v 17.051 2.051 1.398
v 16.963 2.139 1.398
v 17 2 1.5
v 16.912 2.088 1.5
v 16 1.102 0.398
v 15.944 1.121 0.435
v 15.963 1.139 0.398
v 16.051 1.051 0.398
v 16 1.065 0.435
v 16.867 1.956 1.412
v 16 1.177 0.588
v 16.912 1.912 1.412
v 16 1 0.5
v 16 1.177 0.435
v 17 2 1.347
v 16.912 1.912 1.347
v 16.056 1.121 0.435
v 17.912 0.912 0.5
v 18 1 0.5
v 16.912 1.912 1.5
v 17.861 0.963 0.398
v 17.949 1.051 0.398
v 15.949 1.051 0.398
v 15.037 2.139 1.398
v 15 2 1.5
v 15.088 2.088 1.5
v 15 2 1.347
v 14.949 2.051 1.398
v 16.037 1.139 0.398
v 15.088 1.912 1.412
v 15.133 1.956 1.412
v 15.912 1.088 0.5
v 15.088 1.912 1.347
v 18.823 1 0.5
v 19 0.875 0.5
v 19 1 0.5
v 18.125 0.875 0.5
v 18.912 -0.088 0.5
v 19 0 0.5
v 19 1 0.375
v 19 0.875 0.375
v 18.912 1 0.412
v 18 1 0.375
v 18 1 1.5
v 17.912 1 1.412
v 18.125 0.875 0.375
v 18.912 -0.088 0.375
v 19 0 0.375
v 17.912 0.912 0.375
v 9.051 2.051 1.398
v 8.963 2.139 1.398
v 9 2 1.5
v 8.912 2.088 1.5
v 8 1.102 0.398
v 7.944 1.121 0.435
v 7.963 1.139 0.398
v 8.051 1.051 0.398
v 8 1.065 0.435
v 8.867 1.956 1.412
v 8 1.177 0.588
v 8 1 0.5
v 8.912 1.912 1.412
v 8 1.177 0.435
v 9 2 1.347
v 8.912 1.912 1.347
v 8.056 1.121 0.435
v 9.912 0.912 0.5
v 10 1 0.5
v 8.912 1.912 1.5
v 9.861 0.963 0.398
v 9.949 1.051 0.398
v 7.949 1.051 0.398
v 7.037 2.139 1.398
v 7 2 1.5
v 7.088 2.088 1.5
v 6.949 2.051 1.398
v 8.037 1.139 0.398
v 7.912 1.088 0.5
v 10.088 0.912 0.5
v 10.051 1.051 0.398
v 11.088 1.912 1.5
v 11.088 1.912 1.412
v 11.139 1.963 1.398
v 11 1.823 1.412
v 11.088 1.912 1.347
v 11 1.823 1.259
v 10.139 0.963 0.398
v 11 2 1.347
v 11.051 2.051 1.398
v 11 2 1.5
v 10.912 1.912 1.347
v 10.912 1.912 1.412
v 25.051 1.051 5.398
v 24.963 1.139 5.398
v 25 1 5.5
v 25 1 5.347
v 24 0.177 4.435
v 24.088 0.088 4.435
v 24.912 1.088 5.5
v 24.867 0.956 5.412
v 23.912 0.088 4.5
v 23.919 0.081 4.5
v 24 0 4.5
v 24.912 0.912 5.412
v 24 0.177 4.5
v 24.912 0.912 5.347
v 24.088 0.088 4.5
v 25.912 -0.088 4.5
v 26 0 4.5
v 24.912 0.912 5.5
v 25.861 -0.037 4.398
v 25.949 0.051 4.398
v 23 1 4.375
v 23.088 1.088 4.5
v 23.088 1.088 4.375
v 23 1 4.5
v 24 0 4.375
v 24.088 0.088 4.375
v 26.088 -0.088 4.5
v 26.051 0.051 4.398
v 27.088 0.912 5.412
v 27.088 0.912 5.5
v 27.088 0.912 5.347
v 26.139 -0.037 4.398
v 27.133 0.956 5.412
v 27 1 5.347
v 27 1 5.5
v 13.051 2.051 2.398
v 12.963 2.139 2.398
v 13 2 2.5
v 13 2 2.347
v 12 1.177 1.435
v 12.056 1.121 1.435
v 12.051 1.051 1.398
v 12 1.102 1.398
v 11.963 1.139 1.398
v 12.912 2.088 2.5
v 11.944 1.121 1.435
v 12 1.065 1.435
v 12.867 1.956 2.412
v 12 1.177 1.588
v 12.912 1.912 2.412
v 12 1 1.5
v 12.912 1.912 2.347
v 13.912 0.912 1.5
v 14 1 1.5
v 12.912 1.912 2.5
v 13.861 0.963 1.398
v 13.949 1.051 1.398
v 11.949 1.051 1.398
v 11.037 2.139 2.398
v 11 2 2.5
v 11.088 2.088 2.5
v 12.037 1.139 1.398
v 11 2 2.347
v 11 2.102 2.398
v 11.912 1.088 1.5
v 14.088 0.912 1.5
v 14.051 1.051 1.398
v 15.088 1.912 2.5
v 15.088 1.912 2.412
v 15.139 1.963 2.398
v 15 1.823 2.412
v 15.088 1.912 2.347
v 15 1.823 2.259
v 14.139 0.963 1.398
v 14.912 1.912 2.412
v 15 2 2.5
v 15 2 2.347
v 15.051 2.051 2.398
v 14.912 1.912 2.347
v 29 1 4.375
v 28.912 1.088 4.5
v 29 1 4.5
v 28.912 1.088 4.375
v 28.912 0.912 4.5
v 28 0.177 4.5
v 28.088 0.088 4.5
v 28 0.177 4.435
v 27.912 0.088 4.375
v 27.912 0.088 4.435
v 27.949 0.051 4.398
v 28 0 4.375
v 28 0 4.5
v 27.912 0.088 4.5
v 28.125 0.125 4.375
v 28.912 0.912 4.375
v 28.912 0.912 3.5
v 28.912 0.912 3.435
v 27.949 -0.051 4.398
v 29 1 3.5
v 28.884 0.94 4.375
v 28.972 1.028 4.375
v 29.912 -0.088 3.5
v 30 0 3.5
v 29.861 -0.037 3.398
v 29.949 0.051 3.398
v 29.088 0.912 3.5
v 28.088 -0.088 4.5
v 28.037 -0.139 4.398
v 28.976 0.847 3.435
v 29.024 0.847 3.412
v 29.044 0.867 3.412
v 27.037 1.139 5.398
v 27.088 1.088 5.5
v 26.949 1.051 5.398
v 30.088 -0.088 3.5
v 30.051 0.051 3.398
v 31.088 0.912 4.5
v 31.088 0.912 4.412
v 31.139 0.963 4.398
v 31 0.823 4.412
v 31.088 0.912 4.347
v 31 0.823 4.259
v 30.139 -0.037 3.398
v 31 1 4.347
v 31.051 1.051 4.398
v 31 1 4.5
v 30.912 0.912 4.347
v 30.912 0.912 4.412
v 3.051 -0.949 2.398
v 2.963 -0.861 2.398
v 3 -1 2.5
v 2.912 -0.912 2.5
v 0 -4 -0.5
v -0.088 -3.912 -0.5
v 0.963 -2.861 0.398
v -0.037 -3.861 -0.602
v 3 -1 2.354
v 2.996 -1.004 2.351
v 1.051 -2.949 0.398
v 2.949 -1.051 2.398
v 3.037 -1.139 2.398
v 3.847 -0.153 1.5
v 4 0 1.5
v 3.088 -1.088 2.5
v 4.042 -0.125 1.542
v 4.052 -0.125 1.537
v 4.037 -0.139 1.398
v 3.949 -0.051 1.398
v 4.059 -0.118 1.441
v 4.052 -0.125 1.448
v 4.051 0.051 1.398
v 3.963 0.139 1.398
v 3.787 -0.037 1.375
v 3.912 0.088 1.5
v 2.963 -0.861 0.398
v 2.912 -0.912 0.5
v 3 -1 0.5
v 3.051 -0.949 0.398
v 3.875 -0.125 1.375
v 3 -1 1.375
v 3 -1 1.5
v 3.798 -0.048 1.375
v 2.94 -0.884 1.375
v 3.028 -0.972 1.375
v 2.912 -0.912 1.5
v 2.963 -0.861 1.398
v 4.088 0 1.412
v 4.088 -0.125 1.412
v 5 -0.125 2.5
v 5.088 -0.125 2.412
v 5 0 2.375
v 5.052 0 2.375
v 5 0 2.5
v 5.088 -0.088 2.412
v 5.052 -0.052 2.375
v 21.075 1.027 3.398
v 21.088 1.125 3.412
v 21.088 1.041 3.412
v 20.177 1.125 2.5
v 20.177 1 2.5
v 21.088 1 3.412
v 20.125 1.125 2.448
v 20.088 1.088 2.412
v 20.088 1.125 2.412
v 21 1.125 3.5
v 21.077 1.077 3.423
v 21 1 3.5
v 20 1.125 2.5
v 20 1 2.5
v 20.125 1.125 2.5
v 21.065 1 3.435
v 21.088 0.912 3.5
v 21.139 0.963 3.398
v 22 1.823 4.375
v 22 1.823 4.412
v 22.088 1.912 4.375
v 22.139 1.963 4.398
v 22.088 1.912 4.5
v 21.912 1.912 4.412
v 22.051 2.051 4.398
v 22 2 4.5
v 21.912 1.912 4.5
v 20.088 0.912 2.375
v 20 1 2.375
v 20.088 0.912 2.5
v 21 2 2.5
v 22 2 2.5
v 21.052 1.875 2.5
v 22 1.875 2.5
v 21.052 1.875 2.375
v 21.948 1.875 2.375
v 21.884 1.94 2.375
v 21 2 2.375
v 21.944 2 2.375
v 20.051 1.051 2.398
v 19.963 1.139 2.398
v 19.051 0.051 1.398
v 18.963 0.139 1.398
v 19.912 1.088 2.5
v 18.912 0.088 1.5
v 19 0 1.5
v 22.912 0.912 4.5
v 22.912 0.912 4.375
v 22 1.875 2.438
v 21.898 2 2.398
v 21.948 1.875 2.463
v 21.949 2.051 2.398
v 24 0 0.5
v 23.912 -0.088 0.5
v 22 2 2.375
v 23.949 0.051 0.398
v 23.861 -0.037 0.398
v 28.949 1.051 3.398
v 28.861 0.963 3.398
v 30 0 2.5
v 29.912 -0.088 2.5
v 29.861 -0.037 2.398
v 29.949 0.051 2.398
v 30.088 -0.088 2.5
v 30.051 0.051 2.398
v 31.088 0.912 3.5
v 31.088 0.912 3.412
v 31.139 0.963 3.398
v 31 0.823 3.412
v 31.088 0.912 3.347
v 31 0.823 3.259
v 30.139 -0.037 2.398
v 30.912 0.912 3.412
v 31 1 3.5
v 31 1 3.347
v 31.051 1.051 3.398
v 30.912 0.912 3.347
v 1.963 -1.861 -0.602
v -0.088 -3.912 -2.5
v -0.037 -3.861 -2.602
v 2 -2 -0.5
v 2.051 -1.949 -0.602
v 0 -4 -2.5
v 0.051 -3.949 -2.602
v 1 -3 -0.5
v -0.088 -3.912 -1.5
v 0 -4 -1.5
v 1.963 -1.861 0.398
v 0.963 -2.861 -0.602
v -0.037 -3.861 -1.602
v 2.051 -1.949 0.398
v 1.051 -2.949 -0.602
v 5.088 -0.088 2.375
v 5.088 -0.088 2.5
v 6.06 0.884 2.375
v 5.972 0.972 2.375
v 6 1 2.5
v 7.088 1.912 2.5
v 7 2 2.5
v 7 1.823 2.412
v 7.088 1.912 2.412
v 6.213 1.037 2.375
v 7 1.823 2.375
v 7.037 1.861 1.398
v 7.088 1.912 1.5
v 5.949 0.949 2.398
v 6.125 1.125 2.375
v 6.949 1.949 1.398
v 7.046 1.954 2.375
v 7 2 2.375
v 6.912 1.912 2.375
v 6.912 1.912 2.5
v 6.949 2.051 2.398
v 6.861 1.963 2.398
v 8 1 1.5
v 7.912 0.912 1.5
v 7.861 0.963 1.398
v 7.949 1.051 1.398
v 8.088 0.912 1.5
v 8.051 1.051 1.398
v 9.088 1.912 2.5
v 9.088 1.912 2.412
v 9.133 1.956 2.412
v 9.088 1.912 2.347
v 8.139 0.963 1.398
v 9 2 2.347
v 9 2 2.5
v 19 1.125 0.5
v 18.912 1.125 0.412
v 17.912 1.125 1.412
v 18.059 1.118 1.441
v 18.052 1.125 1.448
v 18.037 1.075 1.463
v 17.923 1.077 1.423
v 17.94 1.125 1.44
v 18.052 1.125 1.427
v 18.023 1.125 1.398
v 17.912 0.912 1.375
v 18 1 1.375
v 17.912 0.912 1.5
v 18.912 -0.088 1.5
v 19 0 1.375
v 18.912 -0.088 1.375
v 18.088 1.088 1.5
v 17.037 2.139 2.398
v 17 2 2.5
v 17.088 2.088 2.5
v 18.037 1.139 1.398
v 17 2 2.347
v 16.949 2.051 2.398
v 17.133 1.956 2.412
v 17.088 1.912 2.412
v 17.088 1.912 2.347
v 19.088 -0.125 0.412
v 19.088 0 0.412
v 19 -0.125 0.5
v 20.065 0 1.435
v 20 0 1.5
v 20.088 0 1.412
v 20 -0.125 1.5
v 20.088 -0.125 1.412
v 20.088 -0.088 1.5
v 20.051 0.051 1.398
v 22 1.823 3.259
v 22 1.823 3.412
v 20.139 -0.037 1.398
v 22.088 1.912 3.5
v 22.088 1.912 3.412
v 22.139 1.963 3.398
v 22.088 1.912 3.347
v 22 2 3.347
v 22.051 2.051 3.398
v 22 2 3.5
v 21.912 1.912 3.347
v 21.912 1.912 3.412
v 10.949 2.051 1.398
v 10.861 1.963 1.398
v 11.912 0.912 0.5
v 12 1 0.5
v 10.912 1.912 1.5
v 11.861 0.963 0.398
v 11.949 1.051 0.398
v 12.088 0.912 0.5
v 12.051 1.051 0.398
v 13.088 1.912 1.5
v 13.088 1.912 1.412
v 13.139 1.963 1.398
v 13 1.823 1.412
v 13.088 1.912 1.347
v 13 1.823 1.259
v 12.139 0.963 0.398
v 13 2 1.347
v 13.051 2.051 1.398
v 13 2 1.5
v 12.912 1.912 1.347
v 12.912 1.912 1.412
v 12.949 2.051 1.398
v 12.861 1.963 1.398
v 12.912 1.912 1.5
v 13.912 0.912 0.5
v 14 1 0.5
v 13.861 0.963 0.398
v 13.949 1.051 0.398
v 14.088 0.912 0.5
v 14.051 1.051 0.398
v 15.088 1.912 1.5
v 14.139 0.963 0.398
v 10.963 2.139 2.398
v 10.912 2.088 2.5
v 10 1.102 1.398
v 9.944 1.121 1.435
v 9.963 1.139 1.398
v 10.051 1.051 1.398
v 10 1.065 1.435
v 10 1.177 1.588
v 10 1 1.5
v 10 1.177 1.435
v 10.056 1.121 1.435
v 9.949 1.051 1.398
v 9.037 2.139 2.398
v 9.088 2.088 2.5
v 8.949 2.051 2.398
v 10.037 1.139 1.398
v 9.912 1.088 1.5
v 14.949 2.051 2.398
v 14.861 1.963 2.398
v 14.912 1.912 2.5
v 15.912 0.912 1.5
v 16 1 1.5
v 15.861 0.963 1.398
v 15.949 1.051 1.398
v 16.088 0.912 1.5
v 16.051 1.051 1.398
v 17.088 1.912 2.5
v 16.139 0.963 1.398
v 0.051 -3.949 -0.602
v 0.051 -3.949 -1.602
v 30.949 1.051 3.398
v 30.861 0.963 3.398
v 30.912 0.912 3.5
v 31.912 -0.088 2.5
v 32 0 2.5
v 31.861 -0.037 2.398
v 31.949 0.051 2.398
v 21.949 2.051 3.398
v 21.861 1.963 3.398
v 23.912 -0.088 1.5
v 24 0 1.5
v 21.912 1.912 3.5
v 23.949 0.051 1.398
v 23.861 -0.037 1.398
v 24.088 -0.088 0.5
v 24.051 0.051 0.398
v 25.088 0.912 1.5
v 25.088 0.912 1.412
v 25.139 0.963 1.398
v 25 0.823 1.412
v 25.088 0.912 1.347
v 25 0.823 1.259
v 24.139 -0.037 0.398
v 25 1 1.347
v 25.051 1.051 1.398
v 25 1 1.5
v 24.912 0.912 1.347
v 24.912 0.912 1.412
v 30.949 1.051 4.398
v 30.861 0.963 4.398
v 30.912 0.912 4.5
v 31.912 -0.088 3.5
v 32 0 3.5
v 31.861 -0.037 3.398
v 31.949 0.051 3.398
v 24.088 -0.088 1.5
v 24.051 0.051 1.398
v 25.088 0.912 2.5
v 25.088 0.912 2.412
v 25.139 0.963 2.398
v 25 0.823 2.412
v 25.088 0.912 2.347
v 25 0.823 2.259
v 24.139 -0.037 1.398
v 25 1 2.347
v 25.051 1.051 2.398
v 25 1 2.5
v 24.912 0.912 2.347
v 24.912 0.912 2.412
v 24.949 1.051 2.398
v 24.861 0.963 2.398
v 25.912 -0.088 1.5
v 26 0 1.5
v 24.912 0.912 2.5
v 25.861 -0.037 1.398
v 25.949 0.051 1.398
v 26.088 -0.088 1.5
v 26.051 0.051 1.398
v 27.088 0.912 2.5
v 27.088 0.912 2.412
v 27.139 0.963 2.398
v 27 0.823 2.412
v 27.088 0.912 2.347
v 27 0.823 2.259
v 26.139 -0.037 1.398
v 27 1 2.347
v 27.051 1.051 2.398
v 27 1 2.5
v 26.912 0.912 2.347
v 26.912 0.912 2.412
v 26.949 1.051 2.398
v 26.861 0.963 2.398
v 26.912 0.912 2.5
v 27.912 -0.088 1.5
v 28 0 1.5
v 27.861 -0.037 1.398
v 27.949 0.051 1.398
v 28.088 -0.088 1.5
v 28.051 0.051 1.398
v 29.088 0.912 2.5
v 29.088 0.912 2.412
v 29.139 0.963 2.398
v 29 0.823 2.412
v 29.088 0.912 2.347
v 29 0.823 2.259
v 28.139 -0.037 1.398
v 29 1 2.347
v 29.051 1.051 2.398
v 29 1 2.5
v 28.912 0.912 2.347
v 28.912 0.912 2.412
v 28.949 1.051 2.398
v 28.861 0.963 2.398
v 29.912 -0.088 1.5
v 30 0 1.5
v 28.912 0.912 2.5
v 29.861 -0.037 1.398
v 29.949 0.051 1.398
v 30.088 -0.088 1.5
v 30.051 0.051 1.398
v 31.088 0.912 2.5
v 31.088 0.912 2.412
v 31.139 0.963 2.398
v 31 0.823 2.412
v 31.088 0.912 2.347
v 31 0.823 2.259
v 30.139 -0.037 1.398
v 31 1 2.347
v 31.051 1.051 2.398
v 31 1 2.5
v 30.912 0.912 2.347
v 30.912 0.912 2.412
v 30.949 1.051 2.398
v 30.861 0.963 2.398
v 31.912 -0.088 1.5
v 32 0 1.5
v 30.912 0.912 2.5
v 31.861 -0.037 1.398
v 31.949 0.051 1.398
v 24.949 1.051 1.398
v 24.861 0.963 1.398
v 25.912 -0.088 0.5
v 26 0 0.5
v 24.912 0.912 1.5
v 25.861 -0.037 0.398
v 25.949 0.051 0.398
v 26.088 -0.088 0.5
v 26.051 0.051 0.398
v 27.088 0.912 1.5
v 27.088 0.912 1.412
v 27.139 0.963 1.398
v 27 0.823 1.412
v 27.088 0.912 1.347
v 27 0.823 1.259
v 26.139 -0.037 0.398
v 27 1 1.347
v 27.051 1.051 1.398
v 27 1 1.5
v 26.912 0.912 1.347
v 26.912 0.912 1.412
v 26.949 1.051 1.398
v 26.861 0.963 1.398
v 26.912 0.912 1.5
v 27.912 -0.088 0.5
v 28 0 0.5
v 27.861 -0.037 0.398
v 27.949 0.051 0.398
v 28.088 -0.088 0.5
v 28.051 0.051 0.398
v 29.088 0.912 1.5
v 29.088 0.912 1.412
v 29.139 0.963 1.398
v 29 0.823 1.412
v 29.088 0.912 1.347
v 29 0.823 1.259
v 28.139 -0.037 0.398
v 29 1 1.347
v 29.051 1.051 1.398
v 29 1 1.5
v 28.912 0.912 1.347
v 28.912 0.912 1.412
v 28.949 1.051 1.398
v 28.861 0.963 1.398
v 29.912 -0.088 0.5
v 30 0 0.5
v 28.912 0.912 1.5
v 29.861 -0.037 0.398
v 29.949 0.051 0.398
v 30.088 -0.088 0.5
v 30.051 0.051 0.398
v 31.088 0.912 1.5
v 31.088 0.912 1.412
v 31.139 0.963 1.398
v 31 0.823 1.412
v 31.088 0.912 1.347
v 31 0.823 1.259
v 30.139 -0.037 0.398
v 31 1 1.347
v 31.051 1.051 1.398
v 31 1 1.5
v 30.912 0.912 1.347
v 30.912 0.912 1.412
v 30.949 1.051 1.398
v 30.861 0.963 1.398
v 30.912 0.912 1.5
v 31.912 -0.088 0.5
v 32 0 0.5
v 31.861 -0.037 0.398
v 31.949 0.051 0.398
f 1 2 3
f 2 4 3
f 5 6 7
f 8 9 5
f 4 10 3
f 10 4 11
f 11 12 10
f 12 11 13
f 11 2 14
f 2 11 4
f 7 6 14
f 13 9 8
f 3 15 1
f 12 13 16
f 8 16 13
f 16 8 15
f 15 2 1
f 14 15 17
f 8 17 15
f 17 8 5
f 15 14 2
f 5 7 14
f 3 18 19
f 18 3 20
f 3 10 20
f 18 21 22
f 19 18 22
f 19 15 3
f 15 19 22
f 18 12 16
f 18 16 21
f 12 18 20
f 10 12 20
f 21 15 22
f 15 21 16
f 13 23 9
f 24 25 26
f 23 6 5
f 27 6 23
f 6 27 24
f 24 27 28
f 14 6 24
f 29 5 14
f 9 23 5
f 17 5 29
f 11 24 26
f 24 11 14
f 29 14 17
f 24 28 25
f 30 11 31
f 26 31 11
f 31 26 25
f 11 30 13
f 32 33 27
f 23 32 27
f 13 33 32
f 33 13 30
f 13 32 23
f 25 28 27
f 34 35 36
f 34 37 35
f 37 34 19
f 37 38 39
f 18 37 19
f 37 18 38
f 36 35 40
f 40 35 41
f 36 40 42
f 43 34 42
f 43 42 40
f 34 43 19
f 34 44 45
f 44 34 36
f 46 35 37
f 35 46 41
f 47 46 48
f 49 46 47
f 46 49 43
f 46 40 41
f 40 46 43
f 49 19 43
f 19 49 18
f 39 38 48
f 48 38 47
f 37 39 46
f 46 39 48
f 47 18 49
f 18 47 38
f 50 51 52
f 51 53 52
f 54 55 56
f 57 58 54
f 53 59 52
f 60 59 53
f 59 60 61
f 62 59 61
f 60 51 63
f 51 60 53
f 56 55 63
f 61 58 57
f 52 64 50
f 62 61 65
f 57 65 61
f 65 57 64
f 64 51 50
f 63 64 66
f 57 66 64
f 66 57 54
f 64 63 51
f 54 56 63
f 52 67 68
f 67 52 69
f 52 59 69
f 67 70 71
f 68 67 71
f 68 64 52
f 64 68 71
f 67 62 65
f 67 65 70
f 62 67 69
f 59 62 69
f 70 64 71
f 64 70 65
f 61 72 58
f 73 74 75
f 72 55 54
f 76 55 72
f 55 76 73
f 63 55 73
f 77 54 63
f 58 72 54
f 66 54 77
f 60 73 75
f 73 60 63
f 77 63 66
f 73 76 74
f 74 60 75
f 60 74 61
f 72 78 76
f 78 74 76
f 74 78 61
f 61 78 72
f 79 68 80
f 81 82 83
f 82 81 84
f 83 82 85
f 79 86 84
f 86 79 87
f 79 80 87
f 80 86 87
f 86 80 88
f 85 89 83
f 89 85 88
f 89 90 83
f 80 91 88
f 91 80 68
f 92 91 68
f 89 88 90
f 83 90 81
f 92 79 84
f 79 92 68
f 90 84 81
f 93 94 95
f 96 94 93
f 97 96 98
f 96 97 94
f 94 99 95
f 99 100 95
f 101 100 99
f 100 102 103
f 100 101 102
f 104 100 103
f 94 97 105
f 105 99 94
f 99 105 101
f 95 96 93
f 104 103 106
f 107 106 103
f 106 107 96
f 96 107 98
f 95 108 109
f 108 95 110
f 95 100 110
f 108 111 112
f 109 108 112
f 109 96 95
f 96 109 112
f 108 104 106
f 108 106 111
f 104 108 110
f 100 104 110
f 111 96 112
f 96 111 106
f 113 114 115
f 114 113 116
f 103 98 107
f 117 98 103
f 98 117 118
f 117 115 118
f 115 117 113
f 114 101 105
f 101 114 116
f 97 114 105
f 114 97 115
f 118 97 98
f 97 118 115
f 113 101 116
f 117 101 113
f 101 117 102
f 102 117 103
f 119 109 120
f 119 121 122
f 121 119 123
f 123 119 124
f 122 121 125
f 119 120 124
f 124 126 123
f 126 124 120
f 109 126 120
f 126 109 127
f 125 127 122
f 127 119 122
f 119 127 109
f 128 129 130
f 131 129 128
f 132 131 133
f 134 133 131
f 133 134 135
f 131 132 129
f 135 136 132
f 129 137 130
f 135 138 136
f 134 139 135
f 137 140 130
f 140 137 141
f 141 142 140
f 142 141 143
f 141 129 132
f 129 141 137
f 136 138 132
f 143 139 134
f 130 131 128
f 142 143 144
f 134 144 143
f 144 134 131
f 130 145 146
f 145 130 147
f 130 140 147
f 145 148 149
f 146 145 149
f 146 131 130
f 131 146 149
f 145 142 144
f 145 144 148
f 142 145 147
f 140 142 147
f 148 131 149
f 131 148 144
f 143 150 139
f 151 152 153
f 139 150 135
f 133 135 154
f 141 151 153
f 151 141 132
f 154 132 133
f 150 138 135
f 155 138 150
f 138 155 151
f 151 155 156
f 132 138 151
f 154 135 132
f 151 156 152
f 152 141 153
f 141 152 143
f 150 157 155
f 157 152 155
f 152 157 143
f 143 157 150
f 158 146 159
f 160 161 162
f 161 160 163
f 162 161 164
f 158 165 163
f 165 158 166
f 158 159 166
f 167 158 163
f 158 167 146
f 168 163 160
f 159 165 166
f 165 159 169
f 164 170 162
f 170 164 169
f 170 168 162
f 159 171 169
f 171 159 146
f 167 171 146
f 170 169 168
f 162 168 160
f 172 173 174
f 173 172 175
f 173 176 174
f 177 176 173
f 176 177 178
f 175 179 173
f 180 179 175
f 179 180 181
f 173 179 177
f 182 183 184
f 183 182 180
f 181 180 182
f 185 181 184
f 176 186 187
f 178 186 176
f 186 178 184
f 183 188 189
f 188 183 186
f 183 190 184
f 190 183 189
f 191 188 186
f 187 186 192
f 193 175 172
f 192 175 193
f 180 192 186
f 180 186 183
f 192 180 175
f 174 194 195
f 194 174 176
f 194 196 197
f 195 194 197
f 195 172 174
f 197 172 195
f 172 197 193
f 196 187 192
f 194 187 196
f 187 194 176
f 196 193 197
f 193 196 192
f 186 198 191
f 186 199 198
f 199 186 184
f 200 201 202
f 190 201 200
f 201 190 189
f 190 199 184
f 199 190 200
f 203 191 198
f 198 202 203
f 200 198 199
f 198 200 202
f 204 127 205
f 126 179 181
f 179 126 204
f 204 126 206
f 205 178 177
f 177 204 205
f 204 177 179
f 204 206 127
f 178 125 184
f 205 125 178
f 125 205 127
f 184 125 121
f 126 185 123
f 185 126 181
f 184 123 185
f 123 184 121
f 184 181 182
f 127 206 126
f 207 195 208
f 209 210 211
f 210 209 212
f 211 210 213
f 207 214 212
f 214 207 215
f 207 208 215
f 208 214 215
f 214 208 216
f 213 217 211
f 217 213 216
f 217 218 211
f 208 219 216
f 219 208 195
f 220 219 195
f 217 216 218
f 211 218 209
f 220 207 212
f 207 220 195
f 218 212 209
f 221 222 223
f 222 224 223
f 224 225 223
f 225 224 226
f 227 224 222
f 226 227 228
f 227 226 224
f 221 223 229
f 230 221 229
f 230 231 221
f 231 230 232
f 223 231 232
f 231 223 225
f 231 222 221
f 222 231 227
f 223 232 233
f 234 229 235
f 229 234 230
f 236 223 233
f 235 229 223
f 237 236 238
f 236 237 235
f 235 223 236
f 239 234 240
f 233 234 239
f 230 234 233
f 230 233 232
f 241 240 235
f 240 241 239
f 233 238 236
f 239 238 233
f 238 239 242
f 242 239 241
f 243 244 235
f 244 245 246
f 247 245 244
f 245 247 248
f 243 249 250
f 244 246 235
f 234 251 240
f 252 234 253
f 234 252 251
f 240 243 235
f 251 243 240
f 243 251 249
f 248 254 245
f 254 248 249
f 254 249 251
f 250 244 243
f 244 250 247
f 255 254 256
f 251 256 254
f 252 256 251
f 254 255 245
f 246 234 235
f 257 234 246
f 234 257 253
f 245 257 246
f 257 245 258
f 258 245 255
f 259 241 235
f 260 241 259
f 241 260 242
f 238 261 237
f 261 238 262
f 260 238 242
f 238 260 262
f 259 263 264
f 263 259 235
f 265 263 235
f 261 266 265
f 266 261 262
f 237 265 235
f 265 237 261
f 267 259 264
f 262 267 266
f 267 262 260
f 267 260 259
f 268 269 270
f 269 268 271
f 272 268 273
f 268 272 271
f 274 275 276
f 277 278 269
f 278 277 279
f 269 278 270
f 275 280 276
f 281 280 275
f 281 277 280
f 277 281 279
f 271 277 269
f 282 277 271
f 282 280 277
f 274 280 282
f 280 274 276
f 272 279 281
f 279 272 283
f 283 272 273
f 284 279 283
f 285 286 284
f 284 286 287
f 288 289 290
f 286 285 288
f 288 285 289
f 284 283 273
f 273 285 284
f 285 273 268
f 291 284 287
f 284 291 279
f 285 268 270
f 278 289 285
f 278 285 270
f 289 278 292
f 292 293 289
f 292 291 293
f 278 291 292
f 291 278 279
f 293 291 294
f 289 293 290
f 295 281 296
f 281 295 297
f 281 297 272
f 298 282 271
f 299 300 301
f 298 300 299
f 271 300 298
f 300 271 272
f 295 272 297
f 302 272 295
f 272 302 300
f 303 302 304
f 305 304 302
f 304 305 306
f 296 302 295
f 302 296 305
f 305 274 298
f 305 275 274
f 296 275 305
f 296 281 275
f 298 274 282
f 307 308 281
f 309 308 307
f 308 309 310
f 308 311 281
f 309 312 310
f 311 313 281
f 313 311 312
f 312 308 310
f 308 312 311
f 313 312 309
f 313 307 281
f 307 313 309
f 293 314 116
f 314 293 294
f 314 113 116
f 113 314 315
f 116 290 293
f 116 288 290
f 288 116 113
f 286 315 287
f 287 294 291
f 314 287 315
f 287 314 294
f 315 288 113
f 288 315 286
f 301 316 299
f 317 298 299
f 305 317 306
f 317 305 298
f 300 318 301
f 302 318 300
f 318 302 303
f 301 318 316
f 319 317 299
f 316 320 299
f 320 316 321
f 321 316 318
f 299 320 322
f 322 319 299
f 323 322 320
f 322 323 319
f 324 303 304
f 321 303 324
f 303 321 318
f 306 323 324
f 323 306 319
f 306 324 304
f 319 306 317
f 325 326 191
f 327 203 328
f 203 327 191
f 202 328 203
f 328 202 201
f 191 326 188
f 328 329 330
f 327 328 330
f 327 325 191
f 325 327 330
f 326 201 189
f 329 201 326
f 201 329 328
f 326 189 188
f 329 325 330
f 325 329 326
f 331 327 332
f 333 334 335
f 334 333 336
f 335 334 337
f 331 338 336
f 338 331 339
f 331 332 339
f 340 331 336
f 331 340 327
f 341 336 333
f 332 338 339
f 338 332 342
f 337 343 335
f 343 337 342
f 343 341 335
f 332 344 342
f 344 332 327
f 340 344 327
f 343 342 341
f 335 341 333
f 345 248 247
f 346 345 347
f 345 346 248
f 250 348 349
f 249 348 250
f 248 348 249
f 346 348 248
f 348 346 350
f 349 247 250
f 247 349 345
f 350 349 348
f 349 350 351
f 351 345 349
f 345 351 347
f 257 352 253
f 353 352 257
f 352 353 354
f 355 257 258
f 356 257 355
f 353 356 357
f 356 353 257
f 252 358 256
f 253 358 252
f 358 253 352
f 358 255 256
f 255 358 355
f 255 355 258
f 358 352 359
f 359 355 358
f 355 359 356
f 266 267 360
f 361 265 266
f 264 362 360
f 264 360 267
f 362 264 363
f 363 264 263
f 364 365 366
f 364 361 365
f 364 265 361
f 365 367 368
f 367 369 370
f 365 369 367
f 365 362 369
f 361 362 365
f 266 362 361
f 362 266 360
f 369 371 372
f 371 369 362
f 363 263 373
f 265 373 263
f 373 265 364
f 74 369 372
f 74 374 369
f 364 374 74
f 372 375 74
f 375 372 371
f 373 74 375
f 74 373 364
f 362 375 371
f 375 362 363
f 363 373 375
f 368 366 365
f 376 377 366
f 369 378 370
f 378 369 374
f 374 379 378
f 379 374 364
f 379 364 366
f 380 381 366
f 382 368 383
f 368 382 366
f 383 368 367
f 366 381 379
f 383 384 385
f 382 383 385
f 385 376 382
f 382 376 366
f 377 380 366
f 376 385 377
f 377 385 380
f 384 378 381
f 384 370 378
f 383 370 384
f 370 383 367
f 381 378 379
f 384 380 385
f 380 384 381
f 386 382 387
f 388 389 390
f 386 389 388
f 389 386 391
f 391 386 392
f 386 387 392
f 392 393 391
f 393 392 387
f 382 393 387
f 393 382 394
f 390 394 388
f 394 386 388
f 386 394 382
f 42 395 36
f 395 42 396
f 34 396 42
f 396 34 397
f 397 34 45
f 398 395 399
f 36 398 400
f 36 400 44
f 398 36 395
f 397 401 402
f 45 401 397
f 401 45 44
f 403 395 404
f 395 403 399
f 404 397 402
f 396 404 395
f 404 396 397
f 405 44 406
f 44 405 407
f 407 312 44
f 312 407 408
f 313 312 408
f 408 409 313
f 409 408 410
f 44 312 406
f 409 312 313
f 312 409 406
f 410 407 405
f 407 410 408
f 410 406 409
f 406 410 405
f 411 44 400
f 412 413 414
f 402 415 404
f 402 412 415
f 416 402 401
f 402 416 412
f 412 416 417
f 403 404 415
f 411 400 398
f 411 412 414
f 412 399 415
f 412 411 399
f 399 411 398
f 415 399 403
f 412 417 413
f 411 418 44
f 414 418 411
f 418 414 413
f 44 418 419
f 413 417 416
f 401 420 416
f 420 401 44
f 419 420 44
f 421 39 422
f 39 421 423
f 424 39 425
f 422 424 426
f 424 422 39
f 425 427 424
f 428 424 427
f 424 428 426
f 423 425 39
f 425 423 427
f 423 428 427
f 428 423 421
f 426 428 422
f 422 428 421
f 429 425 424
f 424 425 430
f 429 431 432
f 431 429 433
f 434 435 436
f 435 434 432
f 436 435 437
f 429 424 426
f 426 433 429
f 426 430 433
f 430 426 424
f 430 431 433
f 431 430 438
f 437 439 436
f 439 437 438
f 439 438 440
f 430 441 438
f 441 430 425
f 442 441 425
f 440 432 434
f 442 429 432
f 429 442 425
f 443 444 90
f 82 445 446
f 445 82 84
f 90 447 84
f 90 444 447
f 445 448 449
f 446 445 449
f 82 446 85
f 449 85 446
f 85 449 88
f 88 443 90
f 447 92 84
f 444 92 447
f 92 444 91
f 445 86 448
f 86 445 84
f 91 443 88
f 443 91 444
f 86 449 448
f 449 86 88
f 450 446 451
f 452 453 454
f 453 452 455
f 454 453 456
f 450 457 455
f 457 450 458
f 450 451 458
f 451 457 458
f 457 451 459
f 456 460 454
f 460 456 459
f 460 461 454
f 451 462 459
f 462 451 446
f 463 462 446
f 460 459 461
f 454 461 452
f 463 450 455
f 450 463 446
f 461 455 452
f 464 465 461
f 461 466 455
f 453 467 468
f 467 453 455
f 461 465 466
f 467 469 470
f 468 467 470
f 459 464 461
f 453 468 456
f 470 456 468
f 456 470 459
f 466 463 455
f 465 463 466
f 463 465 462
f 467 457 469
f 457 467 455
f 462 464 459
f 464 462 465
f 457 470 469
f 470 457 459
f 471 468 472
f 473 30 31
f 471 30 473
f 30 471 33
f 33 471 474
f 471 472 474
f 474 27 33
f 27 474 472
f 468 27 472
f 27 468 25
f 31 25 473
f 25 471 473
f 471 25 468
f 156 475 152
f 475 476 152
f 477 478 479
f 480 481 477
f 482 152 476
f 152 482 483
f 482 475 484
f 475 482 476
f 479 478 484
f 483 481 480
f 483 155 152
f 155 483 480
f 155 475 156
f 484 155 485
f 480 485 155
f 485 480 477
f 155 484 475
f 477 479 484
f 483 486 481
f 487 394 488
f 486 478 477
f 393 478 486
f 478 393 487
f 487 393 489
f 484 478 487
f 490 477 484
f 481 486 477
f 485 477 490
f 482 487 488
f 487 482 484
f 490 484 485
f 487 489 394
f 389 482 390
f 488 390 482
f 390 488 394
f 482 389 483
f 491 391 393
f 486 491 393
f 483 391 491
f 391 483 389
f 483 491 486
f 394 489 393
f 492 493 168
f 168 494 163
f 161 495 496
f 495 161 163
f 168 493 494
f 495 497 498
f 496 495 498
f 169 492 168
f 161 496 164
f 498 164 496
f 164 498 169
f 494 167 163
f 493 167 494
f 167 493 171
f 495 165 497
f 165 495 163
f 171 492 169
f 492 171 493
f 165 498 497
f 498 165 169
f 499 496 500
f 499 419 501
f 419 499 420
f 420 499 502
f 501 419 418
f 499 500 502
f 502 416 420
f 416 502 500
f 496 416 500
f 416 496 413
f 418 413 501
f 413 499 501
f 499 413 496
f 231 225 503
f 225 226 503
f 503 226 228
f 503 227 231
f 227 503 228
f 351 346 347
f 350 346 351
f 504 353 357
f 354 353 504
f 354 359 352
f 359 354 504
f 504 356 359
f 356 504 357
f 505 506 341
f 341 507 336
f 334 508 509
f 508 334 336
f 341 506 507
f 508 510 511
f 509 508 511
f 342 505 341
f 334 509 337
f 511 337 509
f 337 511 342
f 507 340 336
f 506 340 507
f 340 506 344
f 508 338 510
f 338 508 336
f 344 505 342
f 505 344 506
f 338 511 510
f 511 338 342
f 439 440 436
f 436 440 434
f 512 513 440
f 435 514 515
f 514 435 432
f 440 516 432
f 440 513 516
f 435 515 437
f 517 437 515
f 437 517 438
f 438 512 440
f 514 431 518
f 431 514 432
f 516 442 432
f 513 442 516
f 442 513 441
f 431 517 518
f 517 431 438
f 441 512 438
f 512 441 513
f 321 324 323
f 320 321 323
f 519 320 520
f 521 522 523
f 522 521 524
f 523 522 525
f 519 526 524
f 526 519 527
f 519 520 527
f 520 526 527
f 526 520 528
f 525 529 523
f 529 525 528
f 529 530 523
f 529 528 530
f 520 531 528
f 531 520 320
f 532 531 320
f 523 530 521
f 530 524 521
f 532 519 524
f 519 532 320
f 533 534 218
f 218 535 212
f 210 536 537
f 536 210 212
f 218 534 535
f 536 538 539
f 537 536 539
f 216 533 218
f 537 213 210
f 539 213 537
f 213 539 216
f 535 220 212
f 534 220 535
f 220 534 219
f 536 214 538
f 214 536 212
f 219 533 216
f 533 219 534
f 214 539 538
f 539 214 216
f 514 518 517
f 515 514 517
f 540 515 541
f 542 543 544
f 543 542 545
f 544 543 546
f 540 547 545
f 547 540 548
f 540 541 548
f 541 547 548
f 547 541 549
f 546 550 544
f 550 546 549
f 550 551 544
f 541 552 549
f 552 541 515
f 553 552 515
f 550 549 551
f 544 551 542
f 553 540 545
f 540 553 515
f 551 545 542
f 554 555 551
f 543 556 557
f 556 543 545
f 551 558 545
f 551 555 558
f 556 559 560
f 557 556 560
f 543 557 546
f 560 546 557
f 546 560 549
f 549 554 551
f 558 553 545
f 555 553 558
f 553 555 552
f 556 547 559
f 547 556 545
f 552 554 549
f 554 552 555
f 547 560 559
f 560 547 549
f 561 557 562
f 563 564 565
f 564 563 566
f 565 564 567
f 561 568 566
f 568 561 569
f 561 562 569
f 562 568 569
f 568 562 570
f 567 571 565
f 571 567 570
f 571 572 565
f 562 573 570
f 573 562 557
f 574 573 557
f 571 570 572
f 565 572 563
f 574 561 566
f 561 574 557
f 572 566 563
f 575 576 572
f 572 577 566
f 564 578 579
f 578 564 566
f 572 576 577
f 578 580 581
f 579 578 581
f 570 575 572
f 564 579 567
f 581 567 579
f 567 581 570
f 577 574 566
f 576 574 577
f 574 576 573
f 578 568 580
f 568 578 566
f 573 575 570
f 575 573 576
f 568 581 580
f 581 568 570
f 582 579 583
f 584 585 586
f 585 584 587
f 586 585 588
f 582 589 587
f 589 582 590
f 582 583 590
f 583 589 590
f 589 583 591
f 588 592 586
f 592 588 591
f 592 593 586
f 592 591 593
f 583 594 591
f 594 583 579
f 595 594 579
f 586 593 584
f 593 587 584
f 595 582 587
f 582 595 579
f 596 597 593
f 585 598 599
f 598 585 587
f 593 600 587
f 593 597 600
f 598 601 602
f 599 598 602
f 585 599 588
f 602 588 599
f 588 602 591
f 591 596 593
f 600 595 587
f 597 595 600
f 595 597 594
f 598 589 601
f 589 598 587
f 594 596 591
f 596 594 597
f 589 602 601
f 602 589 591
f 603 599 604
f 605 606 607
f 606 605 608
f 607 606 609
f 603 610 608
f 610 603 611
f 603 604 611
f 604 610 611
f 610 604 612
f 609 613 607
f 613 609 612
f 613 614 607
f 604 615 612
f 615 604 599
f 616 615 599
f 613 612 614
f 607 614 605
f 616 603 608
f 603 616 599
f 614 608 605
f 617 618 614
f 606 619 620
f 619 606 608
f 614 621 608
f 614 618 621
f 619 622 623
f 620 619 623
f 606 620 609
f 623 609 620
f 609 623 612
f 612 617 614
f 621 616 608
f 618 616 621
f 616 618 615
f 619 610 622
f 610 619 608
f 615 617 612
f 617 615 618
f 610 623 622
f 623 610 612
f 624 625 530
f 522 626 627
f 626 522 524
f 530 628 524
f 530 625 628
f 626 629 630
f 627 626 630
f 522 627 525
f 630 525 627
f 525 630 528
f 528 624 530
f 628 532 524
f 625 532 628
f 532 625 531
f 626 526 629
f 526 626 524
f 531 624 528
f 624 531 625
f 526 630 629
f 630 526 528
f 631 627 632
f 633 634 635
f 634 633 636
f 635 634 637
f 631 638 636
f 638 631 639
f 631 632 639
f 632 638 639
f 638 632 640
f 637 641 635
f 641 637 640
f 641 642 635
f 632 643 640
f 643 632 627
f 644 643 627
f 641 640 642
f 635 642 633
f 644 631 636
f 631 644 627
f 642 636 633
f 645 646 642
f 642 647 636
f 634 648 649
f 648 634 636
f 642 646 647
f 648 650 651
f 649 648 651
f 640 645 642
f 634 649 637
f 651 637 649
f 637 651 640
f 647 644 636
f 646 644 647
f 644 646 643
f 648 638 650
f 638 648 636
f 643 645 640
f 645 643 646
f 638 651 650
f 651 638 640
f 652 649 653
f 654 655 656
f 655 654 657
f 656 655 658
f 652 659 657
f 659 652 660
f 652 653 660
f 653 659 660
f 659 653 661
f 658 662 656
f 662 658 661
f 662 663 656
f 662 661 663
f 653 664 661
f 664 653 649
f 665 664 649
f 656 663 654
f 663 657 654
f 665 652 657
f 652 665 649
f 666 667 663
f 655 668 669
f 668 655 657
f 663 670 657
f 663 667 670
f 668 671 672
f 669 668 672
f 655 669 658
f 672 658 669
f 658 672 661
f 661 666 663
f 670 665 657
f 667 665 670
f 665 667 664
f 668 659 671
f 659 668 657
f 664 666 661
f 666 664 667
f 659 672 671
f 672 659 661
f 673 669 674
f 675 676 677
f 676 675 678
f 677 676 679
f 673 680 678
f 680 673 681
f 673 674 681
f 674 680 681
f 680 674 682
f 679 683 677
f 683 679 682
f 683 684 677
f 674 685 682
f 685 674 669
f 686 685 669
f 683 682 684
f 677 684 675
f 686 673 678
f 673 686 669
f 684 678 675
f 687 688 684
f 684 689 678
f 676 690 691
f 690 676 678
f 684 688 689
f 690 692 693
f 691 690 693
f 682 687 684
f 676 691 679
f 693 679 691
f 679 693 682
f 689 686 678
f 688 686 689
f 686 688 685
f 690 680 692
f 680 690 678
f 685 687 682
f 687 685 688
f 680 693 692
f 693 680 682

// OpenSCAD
translate(v = [-0.5, -0.5, 0]) {
	union() {
		%union() {
			union() {
				%cube(size = [0, 0, 0]);
				translate(v = [17.0, 2.0, 1.0]) {
					cube(size = [1, 1, 1]);
				}
				color(alpha = 0.1, c = "lightgreen") {
					translate(v = [16.0, 1.0, 0.0]) {
						cube(size = [1, 1, 1]);
					}
				}
				color(alpha = 0.1, c = "lightgreen") {
					translate(v = [18.0, 1.0, 0.0]) {
						cube(size = [1, 1, 1]);
					}
				}
				translate(v = [9.0, 2.0, 1.0]) {
					cube(size = [1, 1, 1]);
				}
				color(alpha = 0.1, c = "lightgreen") {
					translate(v = [8.0, 1.0, 0.0]) {
						cube(size = [1, 1, 1]);
					}
				}
				color(alpha = 0.1, c = "lightgreen") {
					translate(v = [10.0, 1.0, 0.0]) {
						cube(size = [1, 1, 1]);
					}
				}
				translate(v = [25.0, 1.0, 5.0]) {
					cube(size = [1, 1, 1]);
				}
				color(alpha = 0.1, c = "lightgreen") {
					translate(v = [24.0, 0.0, 4.0]) {
						cube(size = [1, 1, 1]);
					}
				}
				color(alpha = 0.1, c = "lightgreen") {
					translate(v = [26.0, 0.0, 4.0]) {
						cube(size = [1, 1, 1]);
					}
				}
				translate(v = [13.0, 2.0, 2.0]) {
					cube(size = [1, 1, 1]);
				}
				color(alpha = 0.1, c = "lightgreen") {
					translate(v = [12.0, 1.0, 1.0]) {
						cube(size = [1, 1, 1]);
					}
				}
				color(alpha = 0.1, c = "lightgreen") {
					translate(v = [14.0, 1.0, 1.0]) {
						cube(size = [1, 1, 1]);
					}
				}
				translate(v = [29.0, 1.0, 4.0]) {
					cube(size = [1, 1, 1]);
				}
				color(alpha = 0.1, c = "lightgreen") {
					translate(v = [28.0, 0.0, 4.0]) {
						cube(size = [1, 1, 1]);
					}
				}
				color(alpha = 0.1, c = "lightgreen") {
					translate(v = [30.0, 0.0, 3.0]) {
						cube(size = [1, 1, 1]);
					}
				}
				translate(v = [3.0, -1.0, 2.0]) {
					cube(size = [1, 1, 1]);
				}
				color(alpha = 0.1, c = "lightgreen") {
					translate(v = [2.0, -2.0, 1.0]) {
						cube(size = [1, 1, 1]);
					}
				}
				color(alpha = 0.1, c = "lightgreen") {
					translate(v = [4.0, -0.0, 1.0]) {
						cube(size = [1, 1, 1]);
					}
				}
				translate(v = [21.0, 1.0, 3.0]) {
					cube(size = [1, 1, 1]);
				}
				color(alpha = 0.1, c = "lightgreen") {
					translate(v = [20.0, 1.0, 2.0]) {
						cube(size = [1, 1, 1]);
					}
				}
				color(alpha = 0.1, c = "lightgreen") {
					translate(v = [22.0, 2.0, 4.0]) {
						cube(size = [1, 1, 1]);
					}
				}
				translate(v = [21.0, 2.0, 2.0]) {
					cube(size = [1, 1, 1]);
				}
				color(alpha = 0.1, c = "lightgreen") {
					translate(v = [22.0, 2.0, 2.0]) {
						cube(size = [1, 1, 1]);
					}
				}
				translate(v = [29.0, 1.0, 3.0]) {
					cube(size = [1, 1, 1]);
				}
				color(alpha = 0.1, c = "lightgreen") {
					translate(v = [30.0, 0.0, 2.0]) {
						cube(size = [1, 1, 1]);
					}
				}
				translate(v = [3.0, -1.0, 0.0]) {
					cube(size = [1, 1, 1]);
				}
				color(alpha = 0.1, c = "lightgreen") {
					translate(v = [2.0, -2.0, -1.0]) {
						cube(size = [1, 1, 1]);
					}
				}
				translate(v = [3.0, -1.0, 1.0]) {
					cube(size = [1, 1, 1]);
				}
				color(alpha = 0.1, c = "lightgreen") {
					translate(v = [2.0, -2.0, 0.0]) {
						cube(size = [1, 1, 1]);
					}
				}
				translate(v = [5.0, 0.0, 2.0]) {
					cube(size = [1, 1, 1]);
				}
				color(alpha = 0.1, c = "lightgreen") {
					translate(v = [6.0, 1.0, 2.0]) {
						cube(size = [1, 1, 1]);
					}
				}
				translate(v = [7.0, 2.0, 1.0]) {
					cube(size = [1, 1, 1]);
				}
				translate(v = [7.0, 2.0, 2.0]) {
					cube(size = [1, 1, 1]);
				}
				color(alpha = 0.1, c = "lightgreen") {
					translate(v = [8.0, 1.0, 1.0]) {
						cube(size = [1, 1, 1]);
					}
				}
				translate(v = [19.0, 1.0, 0.0]) {
					cube(size = [1, 1, 1]);
				}
				color(alpha = 0.1, c = "lightgreen") {
					translate(v = [18.0, 1.0, 1.0]) {
						cube(size = [1, 1, 1]);
					}
				}
				translate(v = [19.0, 0.0, 0.0]) {
					cube(size = [1, 1, 1]);
				}
				color(alpha = 0.1, c = "lightgreen") {
					translate(v = [20.0, 0.0, 1.0]) {
						cube(size = [1, 1, 1]);
					}
				}
				translate(v = [19.0, 0.0, 1.0]) {
					cube(size = [1, 1, 1]);
				}
				translate(v = [11.0, 2.0, 1.0]) {
					cube(size = [1, 1, 1]);
				}
				color(alpha = 0.1, c = "lightgreen") {
					translate(v = [12.0, 1.0, 0.0]) {
						cube(size = [1, 1, 1]);
					}
				}
				translate(v = [13.0, 2.0, 1.0]) {
					cube(size = [1, 1, 1]);
				}
				color(alpha = 0.1, c = "lightgreen") {
					translate(v = [14.0, 1.0, 0.0]) {
						cube(size = [1, 1, 1]);
					}
				}
				translate(v = [15.0, 2.0, 1.0]) {
					cube(size = [1, 1, 1]);
				}
				translate(v = [11.0, 2.0, 2.0]) {
					cube(size = [1, 1, 1]);
				}
				color(alpha = 0.1, c = "lightgreen") {
					translate(v = [10.0, 1.0, 1.0]) {
						cube(size = [1, 1, 1]);
					}
				}
				translate(v = [15.0, 2.0, 2.0]) {
					cube(size = [1, 1, 1]);
				}
				color(alpha = 0.1, c = "lightgreen") {
					translate(v = [16.0, 1.0, 1.0]) {
						cube(size = [1, 1, 1]);
					}
				}
				translate(v = [27.0, 1.0, 5.0]) {
					cube(size = [1, 1, 1]);
				}
				translate(v = [9.0, 2.0, 2.0]) {
					cube(size = [1, 1, 1]);
				}
				translate(v = [17.0, 2.0, 2.0]) {
					cube(size = [1, 1, 1]);
				}
				translate(v = [23.0, 1.0, 4.0]) {
					cube(size = [1, 1, 1]);
				}
				translate(v = [1.0, -3.0, 0.0]) {
					cube(size = [1, 1, 1]);
				}
				translate(v = [-0.0, -4.0, -1.0]) {
					cube(size = [1, 1, 1]);
				}
				translate(v = [1.0, -3.0, -2.0]) {
					cube(size = [1, 1, 1]);
				}
				translate(v = [-0.0, -4.0, -3.0]) {
					cube(size = [1, 1, 1]);
				}
				translate(v = [1.0, -3.0, -1.0]) {
					cube(size = [1, 1, 1]);
				}
				translate(v = [-0.0, -4.0, -2.0]) {
					cube(size = [1, 1, 1]);
				}
				translate(v = [31.0, 1.0, 3.0]) {
					cube(size = [1, 1, 1]);
				}
				translate(v = [32.0, 0.0, 2.0]) {
					cube(size = [1, 1, 1]);
				}
				translate(v = [21.0, 1.0, 2.0]) {
					cube(size = [1, 1, 1]);
				}
				translate(v = [22.0, 2.0, 3.0]) {
					cube(size = [1, 1, 1]);
				}
				translate(v = [23.0, 1.0, 1.0]) {
					cube(size = [1, 1, 1]);
				}
				translate(v = [24.0, 0.0, 0.0]) {
					cube(size = [1, 1, 1]);
				}
				translate(v = [31.0, 1.0, 4.0]) {
					cube(size = [1, 1, 1]);
				}
				translate(v = [32.0, 0.0, 3.0]) {
					cube(size = [1, 1, 1]);
				}
				color(alpha = 0.1, c = "lightblue") {
					translate(v = [23.0, 1.0, 2.0]) {
						cube(size = [1, 1, 1]);
					}
				}
				color(alpha = 0.1, c = "lightblue") {
					translate(v = [24.0, 0.0, 1.0]) {
						cube(size = [1, 1, 1]);
					}
				}
				color(alpha = 0.1, c = "lightblue") {
					translate(v = [25.0, 1.0, 2.0]) {
						cube(size = [1, 1, 1]);
					}
				}
				color(alpha = 0.1, c = "lightblue") {
					translate(v = [26.0, 0.0, 1.0]) {
						cube(size = [1, 1, 1]);
					}
				}
				color(alpha = 0.1, c = "lightblue") {
					translate(v = [27.0, 1.0, 2.0]) {
						cube(size = [1, 1, 1]);
					}
				}
				color(alpha = 0.1, c = "lightblue") {
					translate(v = [28.0, 0.0, 1.0]) {
						cube(size = [1, 1, 1]);
					}
				}
				color(alpha = 0.1, c = "lightblue") {
					translate(v = [29.0, 1.0, 2.0]) {
						cube(size = [1, 1, 1]);
					}
				}
				color(alpha = 0.1, c = "lightblue") {
					translate(v = [30.0, 0.0, 1.0]) {
						cube(size = [1, 1, 1]);
					}
				}
				color(alpha = 0.1, c = "lightblue") {
					translate(v = [31.0, 1.0, 2.0]) {
						cube(size = [1, 1, 1]);
					}
				}
				color(alpha = 0.1, c = "lightblue") {
					translate(v = [32.0, 0.0, 1.0]) {
						cube(size = [1, 1, 1]);
					}
				}
				color(alpha = 0.1, c = "lightblue") {
					translate(v = [25.0, 1.0, 1.0]) {
						cube(size = [1, 1, 1]);
					}
				}
				color(alpha = 0.1, c = "lightblue") {
					translate(v = [26.0, 0.0, 0.0]) {
						cube(size = [1, 1, 1]);
					}
				}
				color(alpha = 0.1, c = "lightblue") {
					translate(v = [27.0, 1.0, 1.0]) {
						cube(size = [1, 1, 1]);
					}
				}
				color(alpha = 0.1, c = "lightblue") {
					translate(v = [28.0, 0.0, 0.0]) {
						cube(size = [1, 1, 1]);
					}
				}
				color(alpha = 0.1, c = "lightblue") {
					translate(v = [29.0, 1.0, 1.0]) {
						cube(size = [1, 1, 1]);
					}
				}
				color(alpha = 0.1, c = "lightblue") {
					translate(v = [30.0, 0.0, 0.0]) {
						cube(size = [1, 1, 1]);
					}
				}
				color(alpha = 0.1, c = "lightblue") {
					translate(v = [31.0, 1.0, 1.0]) {
						cube(size = [1, 1, 1]);
					}
				}
				color(alpha = 0.1, c = "lightblue") {
					translate(v = [32.0, 0.0, 0.0]) {
						cube(size = [1, 1, 1]);
					}
				}
			}
		}
		union() {
			%cube(size = [0, 0, 0]);
			translate(v = [16.5, 1.5, 0.5]) {
				rotate(a = [0, 54.735610317245346, 45.0]) {
					cube(size = [0.125, 0.125, 1.7320508075688772]);
				}
			}
			translate(v = [18.5, 1.5, 0.5]) {
				rotate(a = [0, 54.735610317245346, 135.0]) {
					cube(size = [0.125, 0.125, 1.7320508075688772]);
				}
			}
			translate(v = [15.5, 2.5, 1.5]) {
				rotate(a = [0, 125.26438968275465, -45.0]) {
					cube(size = [0.125, 0.125, 1.7320508075688772]);
				}
			}
			translate(v = [19.5, 1.5, 0.5]) {
				rotate(a = [0, 90.0, 180.0]) {
					cube(size = [0.125, 0.125, 1.0]);
				}
			}
			translate(v = [19.5, 0.5, 0.5]) {
				rotate(a = [0, 90.0, 135.0]) {
					cube(size = [0.125, 0.125, 1.4142135623730951]);
				}
			}
			translate(v = [8.5, 1.5, 0.5]) {
				rotate(a = [0, 54.735610317245346, 45.0]) {
					cube(size = [0.125, 0.125, 1.7320508075688772]);
				}
			}
			translate(v = [10.5, 1.5, 0.5]) {
				rotate(a = [0, 54.735610317245346, 135.0]) {
					cube(size = [0.125, 0.125, 1.7320508075688772]);
				}
			}
			translate(v = [7.5, 2.5, 1.5]) {
				rotate(a = [0, 125.26438968275465, -45.0]) {
					cube(size = [0.125, 0.125, 1.7320508075688772]);
				}
			}
			translate(v = [11.5, 2.5, 1.5]) {
				rotate(a = [0, 125.26438968275465, -135.0]) {
					cube(size = [0.125, 0.125, 1.7320508075688772]);
				}
			}
			translate(v = [24.5, 0.5, 4.5]) {
				rotate(a = [0, 54.735610317245346, 45.0]) {
					cube(size = [0.125, 0.125, 1.7320508075688772]);
				}
			}
			translate(v = [26.5, 0.5, 4.5]) {
				rotate(a = [0, 54.735610317245346, 135.0]) {
					cube(size = [0.125, 0.125, 1.7320508075688772]);
				}
			}
			translate(v = [23.5, 1.5, 4.5]) {
				rotate(a = [0, 90.0, -45.0]) {
					cube(size = [0.125, 0.125, 1.4142135623730951]);
				}
			}
			translate(v = [27.5, 1.5, 5.5]) {
				rotate(a = [0, 125.26438968275465, -135.0]) {
					cube(size = [0.125, 0.125, 1.7320508075688772]);
				}
			}
			translate(v = [12.5, 1.5, 1.5]) {
				rotate(a = [0, 54.735610317245346, 45.0]) {
					cube(size = [0.125, 0.125, 1.7320508075688772]);
				}
			}
			translate(v = [14.5, 1.5, 1.5]) {
				rotate(a = [0, 54.735610317245346, 135.0]) {
					cube(size = [0.125, 0.125, 1.7320508075688772]);
				}
			}
			translate(v = [11.5, 2.5, 2.5]) {
				rotate(a = [0, 125.26438968275465, -45.0]) {
					cube(size = [0.125, 0.125, 1.7320508075688772]);
				}
			}
			translate(v = [15.5, 2.5, 2.5]) {
				rotate(a = [0, 125.26438968275465, -135.0]) {
					cube(size = [0.125, 0.125, 1.7320508075688772]);
				}
			}
			translate(v = [28.5, 0.5, 4.5]) {
				rotate(a = [0, 90.0, 45.0]) {
					cube(size = [0.125, 0.125, 1.4142135623730951]);
				}
			}
			translate(v = [30.5, 0.5, 3.5]) {
				rotate(a = [0, 54.735610317245346, 135.0]) {
					cube(size = [0.125, 0.125, 1.7320508075688772]);
				}
			}
			translate(v = [29.5, 1.5, 3.5]) {
				rotate(a = [0, 54.735610317245346, -135.0]) {
					cube(size = [0.125, 0.125, 1.7320508075688772]);
				}
			}
			translate(v = [27.5, 1.5, 5.5]) {
				rotate(a = [0, 125.26438968275465, -45.0]) {
					cube(size = [0.125, 0.125, 1.7320508075688772]);
				}
			}
			translate(v = [31.5, 1.5, 4.5]) {
				rotate(a = [0, 125.26438968275465, -135.0]) {
					cube(size = [0.125, 0.125, 1.7320508075688772]);
				}
			}
			translate(v = [2.5, -1.5, 1.5]) {
				rotate(a = [0, 54.735610317245346, 45.0]) {
					cube(size = [0.125, 0.125, 1.7320508075688772]);
				}
			}
			translate(v = [4.5, 0.5, 1.5]) {
				rotate(a = [0, 54.735610317245346, -135.0]) {
					cube(size = [0.125, 0.125, 1.7320508075688772]);
				}
			}
			translate(v = [1.5, -2.5, 0.5]) {
				rotate(a = [0, 54.735610317245346, 45.0]) {
					cube(size = [0.125, 0.125, 1.7320508075688772]);
				}
			}
			translate(v = [3.5, -0.5, 0.5]) {
				rotate(a = [0, 54.735610317245346, 45.0]) {
					cube(size = [0.125, 0.125, 1.7320508075688772]);
				}
			}
			translate(v = [3.5, -0.5, 1.5]) {
				rotate(a = [0, 90.0, 45.0]) {
					cube(size = [0.125, 0.125, 1.4142135623730951]);
				}
			}
			translate(v = [5.5, 0.5, 2.5]) {
				rotate(a = [0, 135.0, 180.0]) {
					cube(size = [0.125, 0.125, 1.4142135623730951]);
				}
			}
			translate(v = [20.5, 1.5, 2.5]) {
				rotate(a = [0, 45.00000000000001, 0.0]) {
					cube(size = [0.125, 0.125, 1.4142135623730951]);
				}
			}
			translate(v = [22.5, 2.5, 4.5]) {
				rotate(a = [0, 125.26438968275465, -135.0]) {
					cube(size = [0.125, 0.125, 1.7320508075688772]);
				}
			}
			translate(v = [21.5, 2.5, 2.5]) {
				rotate(a = [0, 90.0, -135.0]) {
					cube(size = [0.125, 0.125, 1.4142135623730951]);
				}
			}
			translate(v = [19.5, 0.5, 1.5]) {
				rotate(a = [0, 54.735610317245346, 45.0]) {
					cube(size = [0.125, 0.125, 1.7320508075688772]);
				}
			}
			translate(v = [23.5, 1.5, 4.5]) {
				rotate(a = [0, 90.0, 135.0]) {
					cube(size = [0.125, 0.125, 1.4142135623730951]);
				}
			}
			translate(v = [22.5, 2.5, 2.5]) {
				rotate(a = [0, 90.0, 180.0]) {
					cube(size = [0.125, 0.125, 1.0]);
				}
			}
			translate(v = [23.5, 1.5, 1.5]) {
				rotate(a = [0, 54.735610317245346, 135.0]) {
					cube(size = [0.125, 0.125, 1.7320508075688772]);
				}
			}
			translate(v = [30.5, 0.5, 2.5]) {
				rotate(a = [0, 54.735610317245346, 135.0]) {
					cube(size = [0.125, 0.125, 1.7320508075688772]);
				}
			}
			translate(v = [31.5, 1.5, 3.5]) {
				rotate(a = [0, 125.26438968275465, -135.0]) {
					cube(size = [0.125, 0.125, 1.7320508075688772]);
				}
			}
			translate(v = [2.5, -1.5, -0.5]) {
				rotate(a = [0, 54.735610317245346, 45.0]) {
					cube(size = [0.125, 0.125, 1.7320508075688772]);
				}
			}
			translate(v = [1.5, -2.5, -1.5]) {
				rotate(a = [0, 54.735610317245346, 45.0]) {
					cube(size = [0.125, 0.125, 1.7320508075688772]);
				}
			}
			translate(v = [2.5, -1.5, 0.5]) {
				rotate(a = [0, 54.735610317245346, 45.0]) {
					cube(size = [0.125, 0.125, 1.7320508075688772]);
				}
			}
			translate(v = [1.5, -2.5, -0.5]) {
				rotate(a = [0, 54.735610317245346, 45.0]) {
					cube(size = [0.125, 0.125, 1.7320508075688772]);
				}
			}
			translate(v = [6.5, 1.5, 2.5]) {
				rotate(a = [0, 90.0, -135.0]) {
					cube(size = [0.125, 0.125, 1.4142135623730951]);
				}
			}
			translate(v = [7.5, 2.5, 1.5]) {
				rotate(a = [0, 54.735610317245346, -135.0]) {
					cube(size = [0.125, 0.125, 1.7320508075688772]);
				}
			}
			translate(v = [7.5, 2.5, 2.5]) {
				rotate(a = [0, 90.0, -135.0]) {
					cube(size = [0.125, 0.125, 1.4142135623730951]);
				}
			}
			translate(v = [8.5, 1.5, 1.5]) {
				rotate(a = [0, 54.735610317245346, 135.0]) {
					cube(size = [0.125, 0.125, 1.7320508075688772]);
				}
			}
			translate(v = [9.5, 2.5, 2.5]) {
				rotate(a = [0, 125.26438968275465, -135.0]) {
					cube(size = [0.125, 0.125, 1.7320508075688772]);
				}
			}
			translate(v = [18.5, 1.5, 1.5]) {
				rotate(a = [0, 135.0, 0.0]) {
					cube(size = [0.125, 0.125, 1.4142135623730951]);
				}
			}
			translate(v = [19.5, 0.5, 1.5]) {
				rotate(a = [0, 90.0, 135.0]) {
					cube(size = [0.125, 0.125, 1.4142135623730951]);
				}
			}
			translate(v = [17.5, 2.5, 2.5]) {
				rotate(a = [0, 125.26438968275465, -45.0]) {
					cube(size = [0.125, 0.125, 1.7320508075688772]);
				}
			}
			translate(v = [20.5, 0.5, 1.5]) {
				rotate(a = [0, 135.0, 180.0]) {
					cube(size = [0.125, 0.125, 1.4142135623730951]);
				}
			}
			translate(v = [21.5, 1.5, 2.5]) {
				rotate(a = [0, 125.26438968275465, -135.0]) {
					cube(size = [0.125, 0.125, 1.7320508075688772]);
				}
			}
			translate(v = [12.5, 1.5, 0.5]) {
				rotate(a = [0, 54.735610317245346, 135.0]) {
					cube(size = [0.125, 0.125, 1.7320508075688772]);
				}
			}
			translate(v = [13.5, 2.5, 1.5]) {
				rotate(a = [0, 125.26438968275465, -135.0]) {
					cube(size = [0.125, 0.125, 1.7320508075688772]);
				}
			}
			translate(v = [14.5, 1.5, 0.5]) {
				rotate(a = [0, 54.735610317245346, 135.0]) {
					cube(size = [0.125, 0.125, 1.7320508075688772]);
				}
			}
			translate(v = [15.5, 2.5, 1.5]) {
				rotate(a = [0, 125.26438968275465, -135.0]) {
					cube(size = [0.125, 0.125, 1.7320508075688772]);
				}
			}
			translate(v = [10.5, 1.5, 1.5]) {
				rotate(a = [0, 54.735610317245346, 45.0]) {
					cube(size = [0.125, 0.125, 1.7320508075688772]);
				}
			}
			translate(v = [9.5, 2.5, 2.5]) {
				rotate(a = [0, 125.26438968275465, -45.0]) {
					cube(size = [0.125, 0.125, 1.7320508075688772]);
				}
			}
			translate(v = [16.5, 1.5, 1.5]) {
				rotate(a = [0, 54.735610317245346, 135.0]) {
					cube(size = [0.125, 0.125, 1.7320508075688772]);
				}
			}
			translate(v = [17.5, 2.5, 2.5]) {
				rotate(a = [0, 125.26438968275465, -135.0]) {
					cube(size = [0.125, 0.125, 1.7320508075688772]);
				}
			}
			translate(v = [0.5, -3.5, -0.5]) {
				rotate(a = [0, 54.735610317245346, 45.0]) {
					cube(size = [0.125, 0.125, 1.7320508075688772]);
				}
			}
			translate(v = [0.5, -3.5, -2.5]) {
				rotate(a = [0, 54.735610317245346, 45.0]) {
					cube(size = [0.125, 0.125, 1.7320508075688772]);
				}
			}
			translate(v = [0.5, -3.5, -1.5]) {
				rotate(a = [0, 54.735610317245346, 45.0]) {
					cube(size = [0.125, 0.125, 1.7320508075688772]);
				}
			}
			translate(v = [32.5, 0.5, 2.5]) {
				rotate(a = [0, 54.735610317245346, 135.0]) {
					cube(size = [0.125, 0.125, 1.7320508075688772]);
				}
			}
			translate(v = [22.5, 2.5, 3.5]) {
				rotate(a = [0, 125.26438968275465, -135.0]) {
					cube(size = [0.125, 0.125, 1.7320508075688772]);
				}
			}
			translate(v = [23.5, 1.5, 2.5]) {
				rotate(a = [0, 54.735610317245346, 135.0]) {
					cube(size = [0.125, 0.125, 1.7320508075688772]);
				}
			}
			translate(v = [24.5, 0.5, 0.5]) {
				rotate(a = [0, 54.735610317245346, 135.0]) {
					cube(size = [0.125, 0.125, 1.7320508075688772]);
				}
			}
			translate(v = [25.5, 1.5, 1.5]) {
				rotate(a = [0, 125.26438968275465, -135.0]) {
					cube(size = [0.125, 0.125, 1.7320508075688772]);
				}
			}
			translate(v = [32.5, 0.5, 3.5]) {
				rotate(a = [0, 54.735610317245346, 135.0]) {
					cube(size = [0.125, 0.125, 1.7320508075688772]);
				}
			}
			translate(v = [24.5, 0.5, 1.5]) {
				rotate(a = [0, 54.735610317245346, 135.0]) {
					cube(size = [0.125, 0.125, 1.7320508075688772]);
				}
			}
			translate(v = [25.5, 1.5, 2.5]) {
				rotate(a = [0, 125.26438968275465, -135.0]) {
					cube(size = [0.125, 0.125, 1.7320508075688772]);
				}
			}
			translate(v = [26.5, 0.5, 1.5]) {
				rotate(a = [0, 54.735610317245346, 135.0]) {
					cube(size = [0.125, 0.125, 1.7320508075688772]);
				}
			}
			translate(v = [27.5, 1.5, 2.5]) {
				rotate(a = [0, 125.26438968275465, -135.0]) {
					cube(size = [0.125, 0.125, 1.7320508075688772]);
				}
			}
			translate(v = [28.5, 0.5, 1.5]) {
				rotate(a = [0, 54.735610317245346, 135.0]) {
					cube(size = [0.125, 0.125, 1.7320508075688772]);
				}
			}
			translate(v = [29.5, 1.5, 2.5]) {
				rotate(a = [0, 125.26438968275465, -135.0]) {
					cube(size = [0.125, 0.125, 1.7320508075688772]);
				}
			}
			translate(v = [30.5, 0.5, 1.5]) {
				rotate(a = [0, 54.735610317245346, 135.0]) {
					cube(size = [0.125, 0.125, 1.7320508075688772]);
				}
			}
			translate(v = [31.5, 1.5, 2.5]) {
				rotate(a = [0, 125.26438968275465, -135.0]) {
					cube(size = [0.125, 0.125, 1.7320508075688772]);
				}
			}
			translate(v = [32.5, 0.5, 1.5]) {
				rotate(a = [0, 54.735610317245346, 135.0]) {
					cube(size = [0.125, 0.125, 1.7320508075688772]);
				}
			}
			translate(v = [26.5, 0.5, 0.5]) {
				rotate(a = [0, 54.735610317245346, 135.0]) {
					cube(size = [0.125, 0.125, 1.7320508075688772]);
				}
			}
			translate(v = [27.5, 1.5, 1.5]) {
				rotate(a = [0, 125.26438968275465, -135.0]) {
					cube(size = [0.125, 0.125, 1.7320508075688772]);
				}
			}
			translate(v = [28.5, 0.5, 0.5]) {
				rotate(a = [0, 54.735610317245346, 135.0]) {
					cube(size = [0.125, 0.125, 1.7320508075688772]);
				}
			}
			translate(v = [29.5, 1.5, 1.5]) {
				rotate(a = [0, 125.26438968275465, -135.0]) {
					cube(size = [0.125, 0.125, 1.7320508075688772]);
				}
			}
			translate(v = [30.5, 0.5, 0.5]) {
				rotate(a = [0, 54.735610317245346, 135.0]) {
					cube(size = [0.125, 0.125, 1.7320508075688772]);
				}
			}
			translate(v = [31.5, 1.5, 1.5]) {
				rotate(a = [0, 125.26438968275465, -135.0]) {
					cube(size = [0.125, 0.125, 1.7320508075688772]);
				}
			}
			translate(v = [32.5, 0.5, 0.5]) {
				rotate(a = [0, 54.735610317245346, 135.0]) {
					cube(size = [0.125, 0.125, 1.7320508075688772]);
				}
			}
		}
	}
}
